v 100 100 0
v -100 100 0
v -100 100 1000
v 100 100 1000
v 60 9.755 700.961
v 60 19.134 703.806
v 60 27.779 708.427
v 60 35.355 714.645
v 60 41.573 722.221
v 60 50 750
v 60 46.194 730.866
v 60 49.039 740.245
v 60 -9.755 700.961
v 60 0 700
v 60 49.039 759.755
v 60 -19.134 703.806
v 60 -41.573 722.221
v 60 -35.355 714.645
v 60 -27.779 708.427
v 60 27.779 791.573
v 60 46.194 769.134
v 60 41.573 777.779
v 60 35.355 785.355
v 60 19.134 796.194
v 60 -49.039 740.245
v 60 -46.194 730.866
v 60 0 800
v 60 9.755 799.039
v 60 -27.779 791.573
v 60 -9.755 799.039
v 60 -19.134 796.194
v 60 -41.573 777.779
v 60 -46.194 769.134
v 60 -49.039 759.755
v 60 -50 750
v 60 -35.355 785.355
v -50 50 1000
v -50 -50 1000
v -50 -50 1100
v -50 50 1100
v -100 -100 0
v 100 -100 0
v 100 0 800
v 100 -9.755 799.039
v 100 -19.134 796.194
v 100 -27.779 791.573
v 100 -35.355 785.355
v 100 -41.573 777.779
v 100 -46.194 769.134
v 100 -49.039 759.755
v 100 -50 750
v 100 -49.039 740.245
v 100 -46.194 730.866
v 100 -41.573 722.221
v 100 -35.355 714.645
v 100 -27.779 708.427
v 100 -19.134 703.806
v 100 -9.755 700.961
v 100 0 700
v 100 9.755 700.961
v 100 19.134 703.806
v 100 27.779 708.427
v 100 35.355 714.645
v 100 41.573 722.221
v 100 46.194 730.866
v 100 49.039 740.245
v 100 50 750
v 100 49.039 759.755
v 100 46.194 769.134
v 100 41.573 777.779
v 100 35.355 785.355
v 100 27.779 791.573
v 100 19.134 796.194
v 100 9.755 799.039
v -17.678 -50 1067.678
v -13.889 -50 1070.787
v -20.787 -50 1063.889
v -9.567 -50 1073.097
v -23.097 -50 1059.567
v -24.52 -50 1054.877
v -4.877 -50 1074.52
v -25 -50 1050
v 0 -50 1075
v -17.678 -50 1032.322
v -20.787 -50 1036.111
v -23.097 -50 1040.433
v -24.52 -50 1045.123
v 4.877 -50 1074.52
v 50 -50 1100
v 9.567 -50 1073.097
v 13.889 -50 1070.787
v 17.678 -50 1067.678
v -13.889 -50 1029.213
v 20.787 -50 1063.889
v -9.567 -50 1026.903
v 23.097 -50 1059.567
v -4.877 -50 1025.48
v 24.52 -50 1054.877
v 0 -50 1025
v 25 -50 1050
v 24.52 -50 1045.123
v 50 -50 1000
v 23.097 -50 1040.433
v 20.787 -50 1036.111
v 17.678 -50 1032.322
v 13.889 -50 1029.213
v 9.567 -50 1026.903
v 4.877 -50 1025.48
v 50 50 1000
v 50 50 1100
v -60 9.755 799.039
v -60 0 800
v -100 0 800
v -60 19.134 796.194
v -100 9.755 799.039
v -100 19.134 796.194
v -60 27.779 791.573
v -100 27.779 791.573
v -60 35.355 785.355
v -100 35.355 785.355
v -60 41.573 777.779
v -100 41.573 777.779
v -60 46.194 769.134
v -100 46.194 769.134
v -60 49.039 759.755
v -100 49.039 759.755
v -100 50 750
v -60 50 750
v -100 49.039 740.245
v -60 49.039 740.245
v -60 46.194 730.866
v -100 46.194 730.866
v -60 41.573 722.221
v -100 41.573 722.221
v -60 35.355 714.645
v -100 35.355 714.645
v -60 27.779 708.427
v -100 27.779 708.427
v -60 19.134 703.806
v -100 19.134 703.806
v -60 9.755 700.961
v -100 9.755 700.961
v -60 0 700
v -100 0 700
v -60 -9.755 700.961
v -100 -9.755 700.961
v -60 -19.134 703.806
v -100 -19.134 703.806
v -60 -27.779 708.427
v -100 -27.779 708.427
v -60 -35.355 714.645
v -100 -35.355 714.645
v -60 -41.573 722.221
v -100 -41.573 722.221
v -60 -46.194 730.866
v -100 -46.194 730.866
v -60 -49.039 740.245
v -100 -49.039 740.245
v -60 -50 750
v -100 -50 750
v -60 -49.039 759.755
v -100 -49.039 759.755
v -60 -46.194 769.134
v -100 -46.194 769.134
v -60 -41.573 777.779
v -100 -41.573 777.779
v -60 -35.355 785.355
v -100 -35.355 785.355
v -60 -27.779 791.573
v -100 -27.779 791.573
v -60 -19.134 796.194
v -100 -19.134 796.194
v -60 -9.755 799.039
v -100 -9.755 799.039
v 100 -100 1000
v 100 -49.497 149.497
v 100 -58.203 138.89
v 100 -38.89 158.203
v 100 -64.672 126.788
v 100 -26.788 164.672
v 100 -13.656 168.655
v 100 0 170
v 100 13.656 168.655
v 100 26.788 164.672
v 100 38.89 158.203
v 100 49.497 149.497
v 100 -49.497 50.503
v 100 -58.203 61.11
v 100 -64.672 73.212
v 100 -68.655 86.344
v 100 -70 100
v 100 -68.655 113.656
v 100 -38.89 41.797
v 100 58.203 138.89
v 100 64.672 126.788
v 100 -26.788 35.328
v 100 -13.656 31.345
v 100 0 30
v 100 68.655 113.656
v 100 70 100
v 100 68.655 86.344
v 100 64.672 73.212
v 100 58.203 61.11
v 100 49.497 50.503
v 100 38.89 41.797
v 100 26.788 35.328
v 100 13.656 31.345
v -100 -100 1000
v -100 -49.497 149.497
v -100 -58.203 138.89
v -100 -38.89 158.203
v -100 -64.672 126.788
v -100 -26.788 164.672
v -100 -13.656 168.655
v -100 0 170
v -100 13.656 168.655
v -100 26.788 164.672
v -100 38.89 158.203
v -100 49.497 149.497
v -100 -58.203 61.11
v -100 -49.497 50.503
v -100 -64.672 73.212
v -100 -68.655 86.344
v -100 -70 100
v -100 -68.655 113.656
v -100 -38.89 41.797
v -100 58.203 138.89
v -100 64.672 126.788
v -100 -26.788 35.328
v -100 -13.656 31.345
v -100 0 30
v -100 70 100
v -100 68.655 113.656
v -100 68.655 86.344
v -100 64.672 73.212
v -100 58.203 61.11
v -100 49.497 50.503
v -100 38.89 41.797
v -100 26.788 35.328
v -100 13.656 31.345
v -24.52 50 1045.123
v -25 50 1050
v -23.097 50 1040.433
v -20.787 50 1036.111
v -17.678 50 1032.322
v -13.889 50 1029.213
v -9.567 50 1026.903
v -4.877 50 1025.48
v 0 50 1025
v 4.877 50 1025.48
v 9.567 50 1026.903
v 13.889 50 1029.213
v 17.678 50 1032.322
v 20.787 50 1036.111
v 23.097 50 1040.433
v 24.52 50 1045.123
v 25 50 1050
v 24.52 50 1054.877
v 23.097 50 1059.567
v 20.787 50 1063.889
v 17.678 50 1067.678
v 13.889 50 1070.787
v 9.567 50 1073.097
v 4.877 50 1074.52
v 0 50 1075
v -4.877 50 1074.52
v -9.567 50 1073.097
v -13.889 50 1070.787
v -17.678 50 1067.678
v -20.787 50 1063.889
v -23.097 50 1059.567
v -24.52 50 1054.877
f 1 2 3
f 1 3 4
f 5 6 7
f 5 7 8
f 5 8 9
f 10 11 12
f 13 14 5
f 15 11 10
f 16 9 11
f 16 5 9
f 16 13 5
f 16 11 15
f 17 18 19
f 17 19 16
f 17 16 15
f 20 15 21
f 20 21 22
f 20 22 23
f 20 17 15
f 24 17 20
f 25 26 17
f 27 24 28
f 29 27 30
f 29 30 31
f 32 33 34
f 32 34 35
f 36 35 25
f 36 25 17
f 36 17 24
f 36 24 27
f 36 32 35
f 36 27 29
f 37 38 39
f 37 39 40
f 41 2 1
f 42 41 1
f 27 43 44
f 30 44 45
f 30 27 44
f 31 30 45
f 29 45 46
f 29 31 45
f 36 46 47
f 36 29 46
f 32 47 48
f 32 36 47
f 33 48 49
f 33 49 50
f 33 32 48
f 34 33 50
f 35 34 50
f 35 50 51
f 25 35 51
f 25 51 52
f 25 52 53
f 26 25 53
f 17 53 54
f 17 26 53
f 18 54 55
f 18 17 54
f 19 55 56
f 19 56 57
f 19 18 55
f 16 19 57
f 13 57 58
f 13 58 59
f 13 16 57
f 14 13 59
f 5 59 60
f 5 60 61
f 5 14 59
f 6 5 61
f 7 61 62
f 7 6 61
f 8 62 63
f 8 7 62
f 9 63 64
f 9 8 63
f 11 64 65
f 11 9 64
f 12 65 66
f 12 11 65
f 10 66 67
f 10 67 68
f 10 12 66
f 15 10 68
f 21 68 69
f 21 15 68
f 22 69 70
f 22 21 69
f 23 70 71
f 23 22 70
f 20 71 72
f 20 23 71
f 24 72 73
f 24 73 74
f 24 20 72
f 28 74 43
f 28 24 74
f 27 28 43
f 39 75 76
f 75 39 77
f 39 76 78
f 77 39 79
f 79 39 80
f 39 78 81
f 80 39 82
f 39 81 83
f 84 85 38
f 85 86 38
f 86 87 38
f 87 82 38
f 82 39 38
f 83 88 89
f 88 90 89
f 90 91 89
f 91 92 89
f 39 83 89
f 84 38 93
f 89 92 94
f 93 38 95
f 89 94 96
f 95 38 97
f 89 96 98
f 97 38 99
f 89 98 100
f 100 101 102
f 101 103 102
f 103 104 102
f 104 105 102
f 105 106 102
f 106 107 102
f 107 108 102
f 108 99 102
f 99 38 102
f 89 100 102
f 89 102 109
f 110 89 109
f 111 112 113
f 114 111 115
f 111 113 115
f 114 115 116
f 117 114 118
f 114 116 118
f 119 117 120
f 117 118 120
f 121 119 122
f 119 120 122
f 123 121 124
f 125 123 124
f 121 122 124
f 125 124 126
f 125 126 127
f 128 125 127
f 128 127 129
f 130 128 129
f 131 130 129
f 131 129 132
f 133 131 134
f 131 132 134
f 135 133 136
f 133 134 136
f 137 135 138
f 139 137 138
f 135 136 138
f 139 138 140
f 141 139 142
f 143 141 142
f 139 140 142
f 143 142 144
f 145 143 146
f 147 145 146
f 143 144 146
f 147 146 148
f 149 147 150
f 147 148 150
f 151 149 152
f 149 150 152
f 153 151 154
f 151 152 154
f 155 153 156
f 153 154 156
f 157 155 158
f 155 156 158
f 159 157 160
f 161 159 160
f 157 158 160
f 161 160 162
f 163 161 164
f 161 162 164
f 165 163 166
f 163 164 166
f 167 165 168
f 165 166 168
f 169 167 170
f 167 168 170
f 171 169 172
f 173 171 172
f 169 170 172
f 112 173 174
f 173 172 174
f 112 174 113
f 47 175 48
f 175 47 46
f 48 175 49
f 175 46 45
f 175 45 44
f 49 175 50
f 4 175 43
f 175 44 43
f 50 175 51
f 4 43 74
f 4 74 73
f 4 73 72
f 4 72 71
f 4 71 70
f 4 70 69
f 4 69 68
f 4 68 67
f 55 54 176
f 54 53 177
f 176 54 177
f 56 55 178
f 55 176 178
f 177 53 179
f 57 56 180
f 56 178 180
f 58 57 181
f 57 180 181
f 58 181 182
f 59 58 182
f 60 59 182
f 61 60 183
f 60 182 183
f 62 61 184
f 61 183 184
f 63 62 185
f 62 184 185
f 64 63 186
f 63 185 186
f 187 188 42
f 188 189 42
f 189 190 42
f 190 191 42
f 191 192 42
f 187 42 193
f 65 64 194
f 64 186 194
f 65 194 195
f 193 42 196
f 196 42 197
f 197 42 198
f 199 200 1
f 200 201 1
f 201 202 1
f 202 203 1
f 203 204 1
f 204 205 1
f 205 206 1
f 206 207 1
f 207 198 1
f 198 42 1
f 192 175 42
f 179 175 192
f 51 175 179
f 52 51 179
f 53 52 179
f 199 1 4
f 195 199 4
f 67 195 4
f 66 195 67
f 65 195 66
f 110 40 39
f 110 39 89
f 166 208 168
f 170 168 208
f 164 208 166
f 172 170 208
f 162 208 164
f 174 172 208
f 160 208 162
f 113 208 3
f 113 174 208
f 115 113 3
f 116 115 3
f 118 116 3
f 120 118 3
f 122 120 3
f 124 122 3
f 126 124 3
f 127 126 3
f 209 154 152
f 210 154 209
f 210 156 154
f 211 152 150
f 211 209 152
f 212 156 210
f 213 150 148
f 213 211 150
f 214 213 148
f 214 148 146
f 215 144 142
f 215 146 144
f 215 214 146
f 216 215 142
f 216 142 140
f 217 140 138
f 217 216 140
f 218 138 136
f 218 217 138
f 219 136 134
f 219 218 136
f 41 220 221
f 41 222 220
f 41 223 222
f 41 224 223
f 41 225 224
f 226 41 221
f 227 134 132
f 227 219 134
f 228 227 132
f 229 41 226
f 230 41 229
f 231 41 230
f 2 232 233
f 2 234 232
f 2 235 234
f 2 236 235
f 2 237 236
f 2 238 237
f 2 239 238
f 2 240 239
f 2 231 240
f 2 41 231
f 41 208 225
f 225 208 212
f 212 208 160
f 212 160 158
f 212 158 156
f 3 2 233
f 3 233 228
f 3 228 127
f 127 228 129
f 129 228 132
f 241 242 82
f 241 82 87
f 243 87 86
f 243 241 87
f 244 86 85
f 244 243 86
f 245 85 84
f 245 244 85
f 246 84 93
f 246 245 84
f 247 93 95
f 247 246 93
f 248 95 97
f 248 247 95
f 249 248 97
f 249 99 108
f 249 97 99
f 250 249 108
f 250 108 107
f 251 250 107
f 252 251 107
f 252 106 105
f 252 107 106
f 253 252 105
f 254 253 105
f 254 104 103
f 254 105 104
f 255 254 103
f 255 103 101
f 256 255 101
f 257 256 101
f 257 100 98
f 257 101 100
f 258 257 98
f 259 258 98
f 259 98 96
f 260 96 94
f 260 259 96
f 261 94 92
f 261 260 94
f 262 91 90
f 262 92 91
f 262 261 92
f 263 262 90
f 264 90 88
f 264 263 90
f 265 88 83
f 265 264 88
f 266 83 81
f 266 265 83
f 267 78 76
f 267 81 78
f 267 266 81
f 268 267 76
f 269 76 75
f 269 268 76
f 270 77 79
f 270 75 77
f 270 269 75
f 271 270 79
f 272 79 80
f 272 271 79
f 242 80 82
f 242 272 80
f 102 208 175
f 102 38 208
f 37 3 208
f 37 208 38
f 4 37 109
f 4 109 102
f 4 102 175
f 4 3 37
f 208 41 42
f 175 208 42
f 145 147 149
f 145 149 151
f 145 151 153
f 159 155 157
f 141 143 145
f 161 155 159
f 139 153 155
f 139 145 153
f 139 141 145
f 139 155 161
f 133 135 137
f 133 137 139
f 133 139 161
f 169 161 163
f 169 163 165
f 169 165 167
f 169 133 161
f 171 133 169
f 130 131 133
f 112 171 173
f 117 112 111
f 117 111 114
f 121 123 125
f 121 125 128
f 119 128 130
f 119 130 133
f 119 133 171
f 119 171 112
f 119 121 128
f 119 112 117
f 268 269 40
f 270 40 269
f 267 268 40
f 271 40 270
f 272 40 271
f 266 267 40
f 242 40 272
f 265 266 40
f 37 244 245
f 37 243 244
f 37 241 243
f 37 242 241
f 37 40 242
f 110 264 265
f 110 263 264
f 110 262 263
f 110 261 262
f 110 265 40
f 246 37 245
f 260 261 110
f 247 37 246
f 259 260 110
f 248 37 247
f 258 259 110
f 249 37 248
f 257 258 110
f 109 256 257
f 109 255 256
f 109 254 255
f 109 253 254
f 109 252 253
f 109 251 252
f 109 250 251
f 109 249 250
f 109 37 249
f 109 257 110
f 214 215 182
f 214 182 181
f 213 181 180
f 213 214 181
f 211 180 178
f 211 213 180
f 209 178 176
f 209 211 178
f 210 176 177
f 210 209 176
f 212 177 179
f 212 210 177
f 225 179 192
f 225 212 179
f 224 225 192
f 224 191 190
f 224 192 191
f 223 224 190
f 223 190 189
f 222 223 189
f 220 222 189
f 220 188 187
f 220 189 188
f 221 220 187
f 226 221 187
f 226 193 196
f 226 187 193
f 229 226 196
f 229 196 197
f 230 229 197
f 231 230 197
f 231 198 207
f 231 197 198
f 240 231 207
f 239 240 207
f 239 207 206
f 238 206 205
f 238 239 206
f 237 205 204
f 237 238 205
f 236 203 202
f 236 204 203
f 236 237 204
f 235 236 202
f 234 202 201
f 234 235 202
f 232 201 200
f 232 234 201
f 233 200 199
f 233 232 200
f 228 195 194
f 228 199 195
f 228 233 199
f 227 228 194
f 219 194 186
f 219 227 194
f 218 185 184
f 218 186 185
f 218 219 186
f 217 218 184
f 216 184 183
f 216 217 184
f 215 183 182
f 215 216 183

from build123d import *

# Parameters (mm, degrees)
SKETCH1_W               = 200
SKETCH1_H               = 200
BOSS_EXTRUDE1_DEPTH     = 1000
CUT_EXTRUDE1_DEPTH      = 100
CUT_EXTRUDE1_DEPTH_BACK = 300
SKETCH2_R               = 70
SKETCH3_W               = 100
SKETCH3_H               = 100
BOSS_EXTRUDE2_DEPTH     = 100
CUT_EXTRUDE2_DEPTH      = 20
CUT_EXTRUDE2_DEPTH_BACK = 130
SKETCH4_R               = 25
SKETCH7_R               = 50
CUT_EXTRUDE5_DEPTH      = 40
CUT_EXTRUDE6_START      = -40
SKETCH6_R               = 50
CUT_EXTRUDE6_DEPTH      = 40


with BuildPart() as part:
    # Sketch1 → Boss-Extrude1 (new body)
    with BuildSketch(Plane.XY):
        Rectangle(SKETCH1_W, SKETCH1_H)
    extrude(amount=BOSS_EXTRUDE1_DEPTH)

    # Sketch2 → Cut-Extrude1 (cut, two sides: drawn at the far end of the back side and taken through both)
    with BuildSketch(Plane(origin=(100, 0, 0), x_dir=(0, 0, -1), z_dir=(1, 0, 0)).offset(-CUT_EXTRUDE1_DEPTH_BACK)):
        with Locations(Location((-100, 0, 0), (0, 0, 180))):
            Circle(SKETCH2_R)
    extrude(amount=CUT_EXTRUDE1_DEPTH + CUT_EXTRUDE1_DEPTH_BACK, mode=Mode.SUBTRACT)

    # Sketch3 → Boss-Extrude2 (add)
    with BuildSketch(Plane.XY.offset(1000)):
        Rectangle(SKETCH3_W, SKETCH3_H)
    extrude(amount=BOSS_EXTRUDE2_DEPTH)

    # Sketch4 → Cut-Extrude2 (cut, two sides: drawn at the far end of the back side and taken through both)
    with BuildSketch(Plane(origin=(0, -50, 0), x_dir=(-1, 0, 0), z_dir=(0, -1, 0)).offset(-CUT_EXTRUDE2_DEPTH_BACK)):
        with Locations((0, -1050)):
            Circle(SKETCH4_R)
    extrude(amount=CUT_EXTRUDE2_DEPTH + CUT_EXTRUDE2_DEPTH_BACK, mode=Mode.SUBTRACT)

    # Sketch7 → Cut-Extrude5 (cut)
    with BuildSketch(Plane.ZY.offset(100)):
        with Locations((750, 0)):
            Circle(SKETCH7_R)
    extrude(amount=-CUT_EXTRUDE5_DEPTH, mode=Mode.SUBTRACT)

    # Sketch6 → Cut-Extrude6 (cut)
    with BuildSketch(Plane(origin=(100, 0, 0), x_dir=(0, 0, -1), z_dir=(1, 0, 0)).offset(CUT_EXTRUDE6_START)):
        with Locations(Location((-750, 0, 0), (0, 0, 180))):
            Circle(SKETCH6_R)
    extrude(amount=CUT_EXTRUDE6_DEPTH, mode=Mode.SUBTRACT)


solid = part.part
